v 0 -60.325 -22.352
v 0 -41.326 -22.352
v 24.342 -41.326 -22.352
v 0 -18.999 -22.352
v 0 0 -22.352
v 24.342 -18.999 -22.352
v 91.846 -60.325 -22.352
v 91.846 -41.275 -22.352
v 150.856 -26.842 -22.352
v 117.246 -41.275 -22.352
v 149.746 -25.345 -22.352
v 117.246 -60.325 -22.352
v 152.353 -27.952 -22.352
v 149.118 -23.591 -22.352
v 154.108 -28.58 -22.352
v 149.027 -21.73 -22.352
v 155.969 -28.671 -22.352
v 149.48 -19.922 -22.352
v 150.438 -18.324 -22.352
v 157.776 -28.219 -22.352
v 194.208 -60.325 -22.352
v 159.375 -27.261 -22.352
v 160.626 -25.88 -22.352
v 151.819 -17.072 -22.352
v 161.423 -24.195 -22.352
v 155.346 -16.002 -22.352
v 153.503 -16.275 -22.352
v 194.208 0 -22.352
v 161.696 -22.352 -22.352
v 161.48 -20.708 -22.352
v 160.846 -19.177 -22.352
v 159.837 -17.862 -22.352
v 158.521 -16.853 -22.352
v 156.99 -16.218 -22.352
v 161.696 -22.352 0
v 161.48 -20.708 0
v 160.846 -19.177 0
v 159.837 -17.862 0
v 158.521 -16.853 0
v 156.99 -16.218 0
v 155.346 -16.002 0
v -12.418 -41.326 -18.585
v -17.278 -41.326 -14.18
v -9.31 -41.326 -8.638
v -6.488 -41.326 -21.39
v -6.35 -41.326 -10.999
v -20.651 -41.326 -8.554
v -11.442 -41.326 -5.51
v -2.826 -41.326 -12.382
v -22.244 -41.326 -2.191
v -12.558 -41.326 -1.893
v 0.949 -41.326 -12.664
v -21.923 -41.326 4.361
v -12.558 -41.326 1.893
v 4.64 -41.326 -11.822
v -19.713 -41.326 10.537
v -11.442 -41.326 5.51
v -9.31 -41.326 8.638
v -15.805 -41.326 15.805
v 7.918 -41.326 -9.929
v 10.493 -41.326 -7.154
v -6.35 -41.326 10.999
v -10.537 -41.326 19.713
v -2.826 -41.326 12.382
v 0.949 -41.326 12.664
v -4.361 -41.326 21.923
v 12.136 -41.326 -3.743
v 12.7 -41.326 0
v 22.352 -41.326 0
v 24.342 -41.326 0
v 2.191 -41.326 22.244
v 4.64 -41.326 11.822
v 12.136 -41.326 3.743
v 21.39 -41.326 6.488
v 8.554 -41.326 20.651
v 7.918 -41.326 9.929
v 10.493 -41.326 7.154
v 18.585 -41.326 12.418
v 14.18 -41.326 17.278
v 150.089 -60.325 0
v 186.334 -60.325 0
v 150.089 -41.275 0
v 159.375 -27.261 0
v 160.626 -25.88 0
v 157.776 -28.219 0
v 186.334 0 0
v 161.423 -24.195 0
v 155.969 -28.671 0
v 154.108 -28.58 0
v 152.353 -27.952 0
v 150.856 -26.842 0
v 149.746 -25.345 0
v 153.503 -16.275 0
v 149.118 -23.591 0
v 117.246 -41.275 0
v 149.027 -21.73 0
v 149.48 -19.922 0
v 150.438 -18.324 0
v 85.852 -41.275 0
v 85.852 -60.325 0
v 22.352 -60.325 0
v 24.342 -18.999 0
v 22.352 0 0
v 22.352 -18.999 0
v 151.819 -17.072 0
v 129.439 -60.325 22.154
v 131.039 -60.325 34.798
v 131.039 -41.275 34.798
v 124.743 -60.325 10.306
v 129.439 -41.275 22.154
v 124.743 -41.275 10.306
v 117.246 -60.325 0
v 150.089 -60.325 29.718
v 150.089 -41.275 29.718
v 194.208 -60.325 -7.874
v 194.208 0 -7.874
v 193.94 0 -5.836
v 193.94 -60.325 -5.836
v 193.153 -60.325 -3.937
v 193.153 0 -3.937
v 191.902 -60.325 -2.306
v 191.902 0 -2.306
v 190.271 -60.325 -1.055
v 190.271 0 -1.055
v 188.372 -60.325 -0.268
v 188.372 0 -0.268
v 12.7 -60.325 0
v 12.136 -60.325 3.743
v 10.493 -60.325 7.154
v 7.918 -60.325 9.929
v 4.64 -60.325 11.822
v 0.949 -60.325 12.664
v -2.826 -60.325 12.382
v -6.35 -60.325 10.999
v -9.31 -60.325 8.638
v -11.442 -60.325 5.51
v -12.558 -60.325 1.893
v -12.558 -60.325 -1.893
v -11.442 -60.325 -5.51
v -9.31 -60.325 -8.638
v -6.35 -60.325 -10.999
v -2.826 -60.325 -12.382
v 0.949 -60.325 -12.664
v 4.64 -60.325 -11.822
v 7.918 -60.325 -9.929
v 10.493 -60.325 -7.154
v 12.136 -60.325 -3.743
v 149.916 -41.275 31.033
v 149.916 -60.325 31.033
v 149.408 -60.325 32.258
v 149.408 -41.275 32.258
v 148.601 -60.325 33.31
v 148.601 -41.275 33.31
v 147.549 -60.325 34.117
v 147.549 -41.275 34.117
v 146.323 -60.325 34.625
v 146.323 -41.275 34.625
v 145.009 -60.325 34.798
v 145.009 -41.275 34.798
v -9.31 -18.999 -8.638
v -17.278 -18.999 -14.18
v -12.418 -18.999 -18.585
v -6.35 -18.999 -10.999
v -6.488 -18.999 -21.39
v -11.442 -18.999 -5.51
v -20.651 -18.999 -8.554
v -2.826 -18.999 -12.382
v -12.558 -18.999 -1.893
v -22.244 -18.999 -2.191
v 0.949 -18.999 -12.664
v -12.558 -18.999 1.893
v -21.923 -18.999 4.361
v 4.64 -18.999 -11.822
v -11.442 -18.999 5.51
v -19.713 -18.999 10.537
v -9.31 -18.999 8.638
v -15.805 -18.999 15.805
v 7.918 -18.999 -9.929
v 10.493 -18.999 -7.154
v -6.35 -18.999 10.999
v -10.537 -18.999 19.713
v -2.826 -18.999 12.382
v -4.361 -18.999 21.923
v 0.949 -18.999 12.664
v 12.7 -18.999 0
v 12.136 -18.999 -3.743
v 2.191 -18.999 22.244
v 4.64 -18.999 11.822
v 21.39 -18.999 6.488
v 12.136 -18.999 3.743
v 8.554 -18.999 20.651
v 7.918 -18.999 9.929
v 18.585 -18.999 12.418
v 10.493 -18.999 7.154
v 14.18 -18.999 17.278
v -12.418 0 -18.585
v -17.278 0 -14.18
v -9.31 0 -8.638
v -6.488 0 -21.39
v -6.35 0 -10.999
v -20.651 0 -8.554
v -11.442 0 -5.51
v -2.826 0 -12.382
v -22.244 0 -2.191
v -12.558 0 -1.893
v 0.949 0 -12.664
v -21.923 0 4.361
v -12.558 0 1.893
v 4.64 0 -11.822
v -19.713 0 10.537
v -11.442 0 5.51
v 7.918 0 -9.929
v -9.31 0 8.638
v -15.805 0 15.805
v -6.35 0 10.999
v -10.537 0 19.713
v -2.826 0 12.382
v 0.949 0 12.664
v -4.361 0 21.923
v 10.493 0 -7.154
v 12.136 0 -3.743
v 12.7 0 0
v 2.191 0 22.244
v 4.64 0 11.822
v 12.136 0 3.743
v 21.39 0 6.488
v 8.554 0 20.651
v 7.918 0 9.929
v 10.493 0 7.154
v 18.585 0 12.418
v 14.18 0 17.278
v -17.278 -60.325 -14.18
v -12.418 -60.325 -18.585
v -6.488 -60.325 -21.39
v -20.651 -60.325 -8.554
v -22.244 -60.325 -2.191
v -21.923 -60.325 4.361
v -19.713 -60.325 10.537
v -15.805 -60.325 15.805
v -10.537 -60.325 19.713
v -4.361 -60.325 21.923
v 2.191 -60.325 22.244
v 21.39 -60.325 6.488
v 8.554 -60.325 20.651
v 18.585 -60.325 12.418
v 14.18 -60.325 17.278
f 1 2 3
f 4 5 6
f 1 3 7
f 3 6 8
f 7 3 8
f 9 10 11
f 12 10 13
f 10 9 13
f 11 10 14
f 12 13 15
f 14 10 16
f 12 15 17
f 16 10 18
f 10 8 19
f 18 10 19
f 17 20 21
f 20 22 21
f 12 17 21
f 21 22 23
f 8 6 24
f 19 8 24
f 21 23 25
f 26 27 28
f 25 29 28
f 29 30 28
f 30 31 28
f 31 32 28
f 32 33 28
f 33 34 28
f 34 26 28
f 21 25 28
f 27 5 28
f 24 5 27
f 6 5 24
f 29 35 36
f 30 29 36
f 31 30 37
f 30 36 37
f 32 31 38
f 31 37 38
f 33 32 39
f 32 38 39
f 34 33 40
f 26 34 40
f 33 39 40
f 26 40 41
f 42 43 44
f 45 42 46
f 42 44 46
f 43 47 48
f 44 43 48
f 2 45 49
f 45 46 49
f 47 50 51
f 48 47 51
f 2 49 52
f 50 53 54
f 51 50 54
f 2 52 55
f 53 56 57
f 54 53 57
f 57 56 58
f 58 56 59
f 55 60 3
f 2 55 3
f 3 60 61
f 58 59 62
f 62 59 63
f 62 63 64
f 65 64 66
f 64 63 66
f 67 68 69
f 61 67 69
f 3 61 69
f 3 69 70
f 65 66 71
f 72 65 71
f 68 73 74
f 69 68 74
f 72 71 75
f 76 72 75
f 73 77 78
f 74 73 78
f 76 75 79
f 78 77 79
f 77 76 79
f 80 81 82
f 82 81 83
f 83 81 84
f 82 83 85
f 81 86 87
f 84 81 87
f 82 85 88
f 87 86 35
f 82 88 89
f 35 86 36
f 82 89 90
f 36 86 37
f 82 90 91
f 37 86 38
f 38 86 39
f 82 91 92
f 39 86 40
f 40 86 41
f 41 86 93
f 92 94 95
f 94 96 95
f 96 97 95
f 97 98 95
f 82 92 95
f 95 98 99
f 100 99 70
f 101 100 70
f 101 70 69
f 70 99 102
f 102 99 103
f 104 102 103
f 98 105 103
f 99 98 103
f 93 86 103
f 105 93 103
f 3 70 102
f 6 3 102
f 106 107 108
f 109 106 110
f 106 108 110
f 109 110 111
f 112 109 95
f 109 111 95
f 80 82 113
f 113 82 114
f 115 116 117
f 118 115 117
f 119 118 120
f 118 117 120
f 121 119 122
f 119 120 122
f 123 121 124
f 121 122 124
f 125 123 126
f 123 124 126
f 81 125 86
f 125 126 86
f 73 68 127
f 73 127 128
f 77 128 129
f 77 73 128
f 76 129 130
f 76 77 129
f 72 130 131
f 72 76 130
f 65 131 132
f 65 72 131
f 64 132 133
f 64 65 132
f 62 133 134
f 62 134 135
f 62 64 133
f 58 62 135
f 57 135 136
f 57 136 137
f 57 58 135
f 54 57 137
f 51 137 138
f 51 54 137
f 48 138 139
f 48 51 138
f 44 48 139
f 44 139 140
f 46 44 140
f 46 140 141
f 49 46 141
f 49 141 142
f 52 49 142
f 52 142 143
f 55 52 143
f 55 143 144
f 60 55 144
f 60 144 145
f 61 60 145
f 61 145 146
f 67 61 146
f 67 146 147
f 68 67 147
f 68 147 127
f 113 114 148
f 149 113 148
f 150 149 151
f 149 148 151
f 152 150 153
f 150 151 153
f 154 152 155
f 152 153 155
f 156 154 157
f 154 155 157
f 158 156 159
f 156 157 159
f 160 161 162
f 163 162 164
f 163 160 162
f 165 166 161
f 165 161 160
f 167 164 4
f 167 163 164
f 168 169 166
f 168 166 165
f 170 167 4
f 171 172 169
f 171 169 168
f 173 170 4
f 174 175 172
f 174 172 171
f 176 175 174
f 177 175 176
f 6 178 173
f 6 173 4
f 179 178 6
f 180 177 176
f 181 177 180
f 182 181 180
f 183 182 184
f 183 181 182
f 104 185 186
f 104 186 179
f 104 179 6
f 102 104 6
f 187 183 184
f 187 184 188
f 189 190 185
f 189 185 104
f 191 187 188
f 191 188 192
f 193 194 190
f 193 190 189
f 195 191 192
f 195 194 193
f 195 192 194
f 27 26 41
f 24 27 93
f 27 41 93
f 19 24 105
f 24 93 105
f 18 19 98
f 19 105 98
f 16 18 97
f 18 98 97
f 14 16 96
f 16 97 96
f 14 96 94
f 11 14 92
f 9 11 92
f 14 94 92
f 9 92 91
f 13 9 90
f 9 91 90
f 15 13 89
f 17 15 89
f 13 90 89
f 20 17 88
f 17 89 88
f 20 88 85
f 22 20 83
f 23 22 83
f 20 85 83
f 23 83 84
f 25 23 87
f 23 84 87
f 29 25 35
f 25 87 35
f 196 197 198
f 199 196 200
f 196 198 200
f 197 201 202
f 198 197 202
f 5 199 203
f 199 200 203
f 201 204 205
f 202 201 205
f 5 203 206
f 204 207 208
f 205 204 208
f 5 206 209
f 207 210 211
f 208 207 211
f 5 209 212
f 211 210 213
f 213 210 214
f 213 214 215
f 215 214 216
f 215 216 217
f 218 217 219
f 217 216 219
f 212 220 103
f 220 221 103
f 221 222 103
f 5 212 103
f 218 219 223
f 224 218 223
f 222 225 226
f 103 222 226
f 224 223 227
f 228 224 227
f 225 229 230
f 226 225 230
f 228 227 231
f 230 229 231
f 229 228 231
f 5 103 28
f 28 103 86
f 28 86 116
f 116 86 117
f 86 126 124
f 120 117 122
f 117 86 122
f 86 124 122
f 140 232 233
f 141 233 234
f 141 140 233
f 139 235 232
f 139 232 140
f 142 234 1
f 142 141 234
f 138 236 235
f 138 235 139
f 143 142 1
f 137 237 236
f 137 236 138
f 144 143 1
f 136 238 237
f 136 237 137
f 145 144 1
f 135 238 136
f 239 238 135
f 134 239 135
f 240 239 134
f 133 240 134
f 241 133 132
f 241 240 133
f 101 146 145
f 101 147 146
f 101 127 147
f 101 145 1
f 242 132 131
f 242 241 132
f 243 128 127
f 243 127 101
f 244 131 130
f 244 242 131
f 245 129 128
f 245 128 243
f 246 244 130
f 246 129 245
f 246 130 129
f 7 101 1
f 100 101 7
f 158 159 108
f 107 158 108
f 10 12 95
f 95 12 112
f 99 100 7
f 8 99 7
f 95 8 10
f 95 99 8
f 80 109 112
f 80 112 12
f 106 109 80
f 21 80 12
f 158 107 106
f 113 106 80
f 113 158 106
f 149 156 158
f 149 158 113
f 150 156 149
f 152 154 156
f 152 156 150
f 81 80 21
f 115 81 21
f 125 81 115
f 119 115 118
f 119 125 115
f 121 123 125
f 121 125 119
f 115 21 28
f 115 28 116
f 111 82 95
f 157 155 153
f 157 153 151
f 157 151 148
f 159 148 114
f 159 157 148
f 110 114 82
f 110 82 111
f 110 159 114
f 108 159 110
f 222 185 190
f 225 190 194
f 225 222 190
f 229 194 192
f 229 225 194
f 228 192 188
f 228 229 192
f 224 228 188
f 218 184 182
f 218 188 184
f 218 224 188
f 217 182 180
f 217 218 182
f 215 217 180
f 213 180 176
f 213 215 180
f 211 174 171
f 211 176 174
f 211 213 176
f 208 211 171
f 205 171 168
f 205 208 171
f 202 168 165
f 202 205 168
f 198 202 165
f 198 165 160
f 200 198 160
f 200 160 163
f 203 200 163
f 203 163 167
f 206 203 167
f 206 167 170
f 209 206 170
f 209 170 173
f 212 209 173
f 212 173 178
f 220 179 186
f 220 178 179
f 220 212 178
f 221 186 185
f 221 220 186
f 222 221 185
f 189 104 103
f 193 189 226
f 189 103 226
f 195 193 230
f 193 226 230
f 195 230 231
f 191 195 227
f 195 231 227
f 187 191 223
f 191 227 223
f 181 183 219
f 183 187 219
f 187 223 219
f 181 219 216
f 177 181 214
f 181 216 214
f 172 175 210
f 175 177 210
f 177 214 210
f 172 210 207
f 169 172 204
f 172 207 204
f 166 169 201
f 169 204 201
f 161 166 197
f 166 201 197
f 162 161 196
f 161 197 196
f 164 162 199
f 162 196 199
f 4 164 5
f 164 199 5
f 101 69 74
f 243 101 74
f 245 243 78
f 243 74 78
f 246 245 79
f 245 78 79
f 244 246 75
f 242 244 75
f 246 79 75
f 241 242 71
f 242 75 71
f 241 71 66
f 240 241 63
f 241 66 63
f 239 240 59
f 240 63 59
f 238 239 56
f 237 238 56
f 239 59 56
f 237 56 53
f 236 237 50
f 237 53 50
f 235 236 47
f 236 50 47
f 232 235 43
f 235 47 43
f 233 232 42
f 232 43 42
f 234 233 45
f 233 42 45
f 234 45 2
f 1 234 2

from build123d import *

# Parameters (mm, degrees)
F0_R     = 12.7
F1_DEPTH = 60.325
F3_DEPTH = 19.05
F4_W     = 46.6944214423
F4_H     = 22.3266
F5_DEPTH = 127
F7_DEPTH = 254
F9_DEPTH = 41.275


with BuildPart() as f1:
    # F0 (on Front) → F1 (new body)
    with BuildSketch(Plane.XZ):
        with BuildLine():
            Line((117.2464, 0), (22.352, 0))
            ThreePointArc((22.352, 0), (-15.8052507731, 15.8052507731), (0, -22.352))
            Line((0, -22.352), (194.2084, -22.352))
            Line((194.2084, -22.352), (194.2084, -7.874))
            ThreePointArc((194.2084, -7.874), (191.9021587951, -2.3062412049), (186.3344, 0))
            Line((186.3344, 0), (150.0886, 0))
            Line((150.0886, 0), (150.0886, 29.718))
            ThreePointArc((150.0886, 29.718), (148.6007024484, 33.3101024484), (145.0086, 34.798))
            Line((145.0086, 34.798), (131.0386, 34.798))
            ThreePointArc((131.0386, 34.798), (127.4644153616, 16.0823576341), (117.2464, 0))
        make_face()
        Circle(F0_R, mode=Mode.SUBTRACT)
    extrude(amount=F1_DEPTH)

    # F2 (on face) → F3 (cut)
    with BuildSketch(Plane.XZ.offset(60.325)):
        Polygon((91.8464, -22.352), (117.2464, -22.352), (117.2464, 0), (85.852, 0), align=None)
    extrude(amount=-F3_DEPTH, mode=Mode.SUBTRACT)

    # F4 (on Top) → F5 (cut, symmetric)
    with BuildSketch(Plane.XY):
        with Locations((0.9952107211, -30.1625)):
            Rectangle(F4_W, F4_H)
    extrude(amount=F5_DEPTH, both=True, mode=Mode.SUBTRACT)

    # F6 (on Top) → F7 (cut)
    with BuildSketch(Plane.XY):
        with BuildLine():
            ThreePointArc((155.3464, -16.002), (150.8562719395, -26.8421280605), (161.6964, -22.352))
            ThreePointArc((161.6964, -22.352), (159.8365280605, -17.8618719395), (155.3464, -16.002))
        make_face()
    extrude(amount=-F7_DEPTH, mode=Mode.SUBTRACT)

    # F8 (on face) → F9 (cut)
    with BuildSketch(Plane(origin=(0, 0, 0), x_dir=(-1, 0, 0), z_dir=(0, 1, 0))):
        with BuildLine():
            Line((-150.0886, 29.718), (-150.0886, 0))
            Line((-150.0886, 0), (-117.2464, 0))
            ThreePointArc((-117.2464, 0), (-127.4644153616, 16.0823576341), (-131.0386, 34.798))
            Line((-131.0386, 34.798), (-145.0086, 34.798))
            ThreePointArc((-145.0086, 34.798), (-148.6007024484, 33.3101024484), (-150.0886, 29.718))
        make_face()
    extrude(amount=-F9_DEPTH, mode=Mode.SUBTRACT)


solid = f1.part
